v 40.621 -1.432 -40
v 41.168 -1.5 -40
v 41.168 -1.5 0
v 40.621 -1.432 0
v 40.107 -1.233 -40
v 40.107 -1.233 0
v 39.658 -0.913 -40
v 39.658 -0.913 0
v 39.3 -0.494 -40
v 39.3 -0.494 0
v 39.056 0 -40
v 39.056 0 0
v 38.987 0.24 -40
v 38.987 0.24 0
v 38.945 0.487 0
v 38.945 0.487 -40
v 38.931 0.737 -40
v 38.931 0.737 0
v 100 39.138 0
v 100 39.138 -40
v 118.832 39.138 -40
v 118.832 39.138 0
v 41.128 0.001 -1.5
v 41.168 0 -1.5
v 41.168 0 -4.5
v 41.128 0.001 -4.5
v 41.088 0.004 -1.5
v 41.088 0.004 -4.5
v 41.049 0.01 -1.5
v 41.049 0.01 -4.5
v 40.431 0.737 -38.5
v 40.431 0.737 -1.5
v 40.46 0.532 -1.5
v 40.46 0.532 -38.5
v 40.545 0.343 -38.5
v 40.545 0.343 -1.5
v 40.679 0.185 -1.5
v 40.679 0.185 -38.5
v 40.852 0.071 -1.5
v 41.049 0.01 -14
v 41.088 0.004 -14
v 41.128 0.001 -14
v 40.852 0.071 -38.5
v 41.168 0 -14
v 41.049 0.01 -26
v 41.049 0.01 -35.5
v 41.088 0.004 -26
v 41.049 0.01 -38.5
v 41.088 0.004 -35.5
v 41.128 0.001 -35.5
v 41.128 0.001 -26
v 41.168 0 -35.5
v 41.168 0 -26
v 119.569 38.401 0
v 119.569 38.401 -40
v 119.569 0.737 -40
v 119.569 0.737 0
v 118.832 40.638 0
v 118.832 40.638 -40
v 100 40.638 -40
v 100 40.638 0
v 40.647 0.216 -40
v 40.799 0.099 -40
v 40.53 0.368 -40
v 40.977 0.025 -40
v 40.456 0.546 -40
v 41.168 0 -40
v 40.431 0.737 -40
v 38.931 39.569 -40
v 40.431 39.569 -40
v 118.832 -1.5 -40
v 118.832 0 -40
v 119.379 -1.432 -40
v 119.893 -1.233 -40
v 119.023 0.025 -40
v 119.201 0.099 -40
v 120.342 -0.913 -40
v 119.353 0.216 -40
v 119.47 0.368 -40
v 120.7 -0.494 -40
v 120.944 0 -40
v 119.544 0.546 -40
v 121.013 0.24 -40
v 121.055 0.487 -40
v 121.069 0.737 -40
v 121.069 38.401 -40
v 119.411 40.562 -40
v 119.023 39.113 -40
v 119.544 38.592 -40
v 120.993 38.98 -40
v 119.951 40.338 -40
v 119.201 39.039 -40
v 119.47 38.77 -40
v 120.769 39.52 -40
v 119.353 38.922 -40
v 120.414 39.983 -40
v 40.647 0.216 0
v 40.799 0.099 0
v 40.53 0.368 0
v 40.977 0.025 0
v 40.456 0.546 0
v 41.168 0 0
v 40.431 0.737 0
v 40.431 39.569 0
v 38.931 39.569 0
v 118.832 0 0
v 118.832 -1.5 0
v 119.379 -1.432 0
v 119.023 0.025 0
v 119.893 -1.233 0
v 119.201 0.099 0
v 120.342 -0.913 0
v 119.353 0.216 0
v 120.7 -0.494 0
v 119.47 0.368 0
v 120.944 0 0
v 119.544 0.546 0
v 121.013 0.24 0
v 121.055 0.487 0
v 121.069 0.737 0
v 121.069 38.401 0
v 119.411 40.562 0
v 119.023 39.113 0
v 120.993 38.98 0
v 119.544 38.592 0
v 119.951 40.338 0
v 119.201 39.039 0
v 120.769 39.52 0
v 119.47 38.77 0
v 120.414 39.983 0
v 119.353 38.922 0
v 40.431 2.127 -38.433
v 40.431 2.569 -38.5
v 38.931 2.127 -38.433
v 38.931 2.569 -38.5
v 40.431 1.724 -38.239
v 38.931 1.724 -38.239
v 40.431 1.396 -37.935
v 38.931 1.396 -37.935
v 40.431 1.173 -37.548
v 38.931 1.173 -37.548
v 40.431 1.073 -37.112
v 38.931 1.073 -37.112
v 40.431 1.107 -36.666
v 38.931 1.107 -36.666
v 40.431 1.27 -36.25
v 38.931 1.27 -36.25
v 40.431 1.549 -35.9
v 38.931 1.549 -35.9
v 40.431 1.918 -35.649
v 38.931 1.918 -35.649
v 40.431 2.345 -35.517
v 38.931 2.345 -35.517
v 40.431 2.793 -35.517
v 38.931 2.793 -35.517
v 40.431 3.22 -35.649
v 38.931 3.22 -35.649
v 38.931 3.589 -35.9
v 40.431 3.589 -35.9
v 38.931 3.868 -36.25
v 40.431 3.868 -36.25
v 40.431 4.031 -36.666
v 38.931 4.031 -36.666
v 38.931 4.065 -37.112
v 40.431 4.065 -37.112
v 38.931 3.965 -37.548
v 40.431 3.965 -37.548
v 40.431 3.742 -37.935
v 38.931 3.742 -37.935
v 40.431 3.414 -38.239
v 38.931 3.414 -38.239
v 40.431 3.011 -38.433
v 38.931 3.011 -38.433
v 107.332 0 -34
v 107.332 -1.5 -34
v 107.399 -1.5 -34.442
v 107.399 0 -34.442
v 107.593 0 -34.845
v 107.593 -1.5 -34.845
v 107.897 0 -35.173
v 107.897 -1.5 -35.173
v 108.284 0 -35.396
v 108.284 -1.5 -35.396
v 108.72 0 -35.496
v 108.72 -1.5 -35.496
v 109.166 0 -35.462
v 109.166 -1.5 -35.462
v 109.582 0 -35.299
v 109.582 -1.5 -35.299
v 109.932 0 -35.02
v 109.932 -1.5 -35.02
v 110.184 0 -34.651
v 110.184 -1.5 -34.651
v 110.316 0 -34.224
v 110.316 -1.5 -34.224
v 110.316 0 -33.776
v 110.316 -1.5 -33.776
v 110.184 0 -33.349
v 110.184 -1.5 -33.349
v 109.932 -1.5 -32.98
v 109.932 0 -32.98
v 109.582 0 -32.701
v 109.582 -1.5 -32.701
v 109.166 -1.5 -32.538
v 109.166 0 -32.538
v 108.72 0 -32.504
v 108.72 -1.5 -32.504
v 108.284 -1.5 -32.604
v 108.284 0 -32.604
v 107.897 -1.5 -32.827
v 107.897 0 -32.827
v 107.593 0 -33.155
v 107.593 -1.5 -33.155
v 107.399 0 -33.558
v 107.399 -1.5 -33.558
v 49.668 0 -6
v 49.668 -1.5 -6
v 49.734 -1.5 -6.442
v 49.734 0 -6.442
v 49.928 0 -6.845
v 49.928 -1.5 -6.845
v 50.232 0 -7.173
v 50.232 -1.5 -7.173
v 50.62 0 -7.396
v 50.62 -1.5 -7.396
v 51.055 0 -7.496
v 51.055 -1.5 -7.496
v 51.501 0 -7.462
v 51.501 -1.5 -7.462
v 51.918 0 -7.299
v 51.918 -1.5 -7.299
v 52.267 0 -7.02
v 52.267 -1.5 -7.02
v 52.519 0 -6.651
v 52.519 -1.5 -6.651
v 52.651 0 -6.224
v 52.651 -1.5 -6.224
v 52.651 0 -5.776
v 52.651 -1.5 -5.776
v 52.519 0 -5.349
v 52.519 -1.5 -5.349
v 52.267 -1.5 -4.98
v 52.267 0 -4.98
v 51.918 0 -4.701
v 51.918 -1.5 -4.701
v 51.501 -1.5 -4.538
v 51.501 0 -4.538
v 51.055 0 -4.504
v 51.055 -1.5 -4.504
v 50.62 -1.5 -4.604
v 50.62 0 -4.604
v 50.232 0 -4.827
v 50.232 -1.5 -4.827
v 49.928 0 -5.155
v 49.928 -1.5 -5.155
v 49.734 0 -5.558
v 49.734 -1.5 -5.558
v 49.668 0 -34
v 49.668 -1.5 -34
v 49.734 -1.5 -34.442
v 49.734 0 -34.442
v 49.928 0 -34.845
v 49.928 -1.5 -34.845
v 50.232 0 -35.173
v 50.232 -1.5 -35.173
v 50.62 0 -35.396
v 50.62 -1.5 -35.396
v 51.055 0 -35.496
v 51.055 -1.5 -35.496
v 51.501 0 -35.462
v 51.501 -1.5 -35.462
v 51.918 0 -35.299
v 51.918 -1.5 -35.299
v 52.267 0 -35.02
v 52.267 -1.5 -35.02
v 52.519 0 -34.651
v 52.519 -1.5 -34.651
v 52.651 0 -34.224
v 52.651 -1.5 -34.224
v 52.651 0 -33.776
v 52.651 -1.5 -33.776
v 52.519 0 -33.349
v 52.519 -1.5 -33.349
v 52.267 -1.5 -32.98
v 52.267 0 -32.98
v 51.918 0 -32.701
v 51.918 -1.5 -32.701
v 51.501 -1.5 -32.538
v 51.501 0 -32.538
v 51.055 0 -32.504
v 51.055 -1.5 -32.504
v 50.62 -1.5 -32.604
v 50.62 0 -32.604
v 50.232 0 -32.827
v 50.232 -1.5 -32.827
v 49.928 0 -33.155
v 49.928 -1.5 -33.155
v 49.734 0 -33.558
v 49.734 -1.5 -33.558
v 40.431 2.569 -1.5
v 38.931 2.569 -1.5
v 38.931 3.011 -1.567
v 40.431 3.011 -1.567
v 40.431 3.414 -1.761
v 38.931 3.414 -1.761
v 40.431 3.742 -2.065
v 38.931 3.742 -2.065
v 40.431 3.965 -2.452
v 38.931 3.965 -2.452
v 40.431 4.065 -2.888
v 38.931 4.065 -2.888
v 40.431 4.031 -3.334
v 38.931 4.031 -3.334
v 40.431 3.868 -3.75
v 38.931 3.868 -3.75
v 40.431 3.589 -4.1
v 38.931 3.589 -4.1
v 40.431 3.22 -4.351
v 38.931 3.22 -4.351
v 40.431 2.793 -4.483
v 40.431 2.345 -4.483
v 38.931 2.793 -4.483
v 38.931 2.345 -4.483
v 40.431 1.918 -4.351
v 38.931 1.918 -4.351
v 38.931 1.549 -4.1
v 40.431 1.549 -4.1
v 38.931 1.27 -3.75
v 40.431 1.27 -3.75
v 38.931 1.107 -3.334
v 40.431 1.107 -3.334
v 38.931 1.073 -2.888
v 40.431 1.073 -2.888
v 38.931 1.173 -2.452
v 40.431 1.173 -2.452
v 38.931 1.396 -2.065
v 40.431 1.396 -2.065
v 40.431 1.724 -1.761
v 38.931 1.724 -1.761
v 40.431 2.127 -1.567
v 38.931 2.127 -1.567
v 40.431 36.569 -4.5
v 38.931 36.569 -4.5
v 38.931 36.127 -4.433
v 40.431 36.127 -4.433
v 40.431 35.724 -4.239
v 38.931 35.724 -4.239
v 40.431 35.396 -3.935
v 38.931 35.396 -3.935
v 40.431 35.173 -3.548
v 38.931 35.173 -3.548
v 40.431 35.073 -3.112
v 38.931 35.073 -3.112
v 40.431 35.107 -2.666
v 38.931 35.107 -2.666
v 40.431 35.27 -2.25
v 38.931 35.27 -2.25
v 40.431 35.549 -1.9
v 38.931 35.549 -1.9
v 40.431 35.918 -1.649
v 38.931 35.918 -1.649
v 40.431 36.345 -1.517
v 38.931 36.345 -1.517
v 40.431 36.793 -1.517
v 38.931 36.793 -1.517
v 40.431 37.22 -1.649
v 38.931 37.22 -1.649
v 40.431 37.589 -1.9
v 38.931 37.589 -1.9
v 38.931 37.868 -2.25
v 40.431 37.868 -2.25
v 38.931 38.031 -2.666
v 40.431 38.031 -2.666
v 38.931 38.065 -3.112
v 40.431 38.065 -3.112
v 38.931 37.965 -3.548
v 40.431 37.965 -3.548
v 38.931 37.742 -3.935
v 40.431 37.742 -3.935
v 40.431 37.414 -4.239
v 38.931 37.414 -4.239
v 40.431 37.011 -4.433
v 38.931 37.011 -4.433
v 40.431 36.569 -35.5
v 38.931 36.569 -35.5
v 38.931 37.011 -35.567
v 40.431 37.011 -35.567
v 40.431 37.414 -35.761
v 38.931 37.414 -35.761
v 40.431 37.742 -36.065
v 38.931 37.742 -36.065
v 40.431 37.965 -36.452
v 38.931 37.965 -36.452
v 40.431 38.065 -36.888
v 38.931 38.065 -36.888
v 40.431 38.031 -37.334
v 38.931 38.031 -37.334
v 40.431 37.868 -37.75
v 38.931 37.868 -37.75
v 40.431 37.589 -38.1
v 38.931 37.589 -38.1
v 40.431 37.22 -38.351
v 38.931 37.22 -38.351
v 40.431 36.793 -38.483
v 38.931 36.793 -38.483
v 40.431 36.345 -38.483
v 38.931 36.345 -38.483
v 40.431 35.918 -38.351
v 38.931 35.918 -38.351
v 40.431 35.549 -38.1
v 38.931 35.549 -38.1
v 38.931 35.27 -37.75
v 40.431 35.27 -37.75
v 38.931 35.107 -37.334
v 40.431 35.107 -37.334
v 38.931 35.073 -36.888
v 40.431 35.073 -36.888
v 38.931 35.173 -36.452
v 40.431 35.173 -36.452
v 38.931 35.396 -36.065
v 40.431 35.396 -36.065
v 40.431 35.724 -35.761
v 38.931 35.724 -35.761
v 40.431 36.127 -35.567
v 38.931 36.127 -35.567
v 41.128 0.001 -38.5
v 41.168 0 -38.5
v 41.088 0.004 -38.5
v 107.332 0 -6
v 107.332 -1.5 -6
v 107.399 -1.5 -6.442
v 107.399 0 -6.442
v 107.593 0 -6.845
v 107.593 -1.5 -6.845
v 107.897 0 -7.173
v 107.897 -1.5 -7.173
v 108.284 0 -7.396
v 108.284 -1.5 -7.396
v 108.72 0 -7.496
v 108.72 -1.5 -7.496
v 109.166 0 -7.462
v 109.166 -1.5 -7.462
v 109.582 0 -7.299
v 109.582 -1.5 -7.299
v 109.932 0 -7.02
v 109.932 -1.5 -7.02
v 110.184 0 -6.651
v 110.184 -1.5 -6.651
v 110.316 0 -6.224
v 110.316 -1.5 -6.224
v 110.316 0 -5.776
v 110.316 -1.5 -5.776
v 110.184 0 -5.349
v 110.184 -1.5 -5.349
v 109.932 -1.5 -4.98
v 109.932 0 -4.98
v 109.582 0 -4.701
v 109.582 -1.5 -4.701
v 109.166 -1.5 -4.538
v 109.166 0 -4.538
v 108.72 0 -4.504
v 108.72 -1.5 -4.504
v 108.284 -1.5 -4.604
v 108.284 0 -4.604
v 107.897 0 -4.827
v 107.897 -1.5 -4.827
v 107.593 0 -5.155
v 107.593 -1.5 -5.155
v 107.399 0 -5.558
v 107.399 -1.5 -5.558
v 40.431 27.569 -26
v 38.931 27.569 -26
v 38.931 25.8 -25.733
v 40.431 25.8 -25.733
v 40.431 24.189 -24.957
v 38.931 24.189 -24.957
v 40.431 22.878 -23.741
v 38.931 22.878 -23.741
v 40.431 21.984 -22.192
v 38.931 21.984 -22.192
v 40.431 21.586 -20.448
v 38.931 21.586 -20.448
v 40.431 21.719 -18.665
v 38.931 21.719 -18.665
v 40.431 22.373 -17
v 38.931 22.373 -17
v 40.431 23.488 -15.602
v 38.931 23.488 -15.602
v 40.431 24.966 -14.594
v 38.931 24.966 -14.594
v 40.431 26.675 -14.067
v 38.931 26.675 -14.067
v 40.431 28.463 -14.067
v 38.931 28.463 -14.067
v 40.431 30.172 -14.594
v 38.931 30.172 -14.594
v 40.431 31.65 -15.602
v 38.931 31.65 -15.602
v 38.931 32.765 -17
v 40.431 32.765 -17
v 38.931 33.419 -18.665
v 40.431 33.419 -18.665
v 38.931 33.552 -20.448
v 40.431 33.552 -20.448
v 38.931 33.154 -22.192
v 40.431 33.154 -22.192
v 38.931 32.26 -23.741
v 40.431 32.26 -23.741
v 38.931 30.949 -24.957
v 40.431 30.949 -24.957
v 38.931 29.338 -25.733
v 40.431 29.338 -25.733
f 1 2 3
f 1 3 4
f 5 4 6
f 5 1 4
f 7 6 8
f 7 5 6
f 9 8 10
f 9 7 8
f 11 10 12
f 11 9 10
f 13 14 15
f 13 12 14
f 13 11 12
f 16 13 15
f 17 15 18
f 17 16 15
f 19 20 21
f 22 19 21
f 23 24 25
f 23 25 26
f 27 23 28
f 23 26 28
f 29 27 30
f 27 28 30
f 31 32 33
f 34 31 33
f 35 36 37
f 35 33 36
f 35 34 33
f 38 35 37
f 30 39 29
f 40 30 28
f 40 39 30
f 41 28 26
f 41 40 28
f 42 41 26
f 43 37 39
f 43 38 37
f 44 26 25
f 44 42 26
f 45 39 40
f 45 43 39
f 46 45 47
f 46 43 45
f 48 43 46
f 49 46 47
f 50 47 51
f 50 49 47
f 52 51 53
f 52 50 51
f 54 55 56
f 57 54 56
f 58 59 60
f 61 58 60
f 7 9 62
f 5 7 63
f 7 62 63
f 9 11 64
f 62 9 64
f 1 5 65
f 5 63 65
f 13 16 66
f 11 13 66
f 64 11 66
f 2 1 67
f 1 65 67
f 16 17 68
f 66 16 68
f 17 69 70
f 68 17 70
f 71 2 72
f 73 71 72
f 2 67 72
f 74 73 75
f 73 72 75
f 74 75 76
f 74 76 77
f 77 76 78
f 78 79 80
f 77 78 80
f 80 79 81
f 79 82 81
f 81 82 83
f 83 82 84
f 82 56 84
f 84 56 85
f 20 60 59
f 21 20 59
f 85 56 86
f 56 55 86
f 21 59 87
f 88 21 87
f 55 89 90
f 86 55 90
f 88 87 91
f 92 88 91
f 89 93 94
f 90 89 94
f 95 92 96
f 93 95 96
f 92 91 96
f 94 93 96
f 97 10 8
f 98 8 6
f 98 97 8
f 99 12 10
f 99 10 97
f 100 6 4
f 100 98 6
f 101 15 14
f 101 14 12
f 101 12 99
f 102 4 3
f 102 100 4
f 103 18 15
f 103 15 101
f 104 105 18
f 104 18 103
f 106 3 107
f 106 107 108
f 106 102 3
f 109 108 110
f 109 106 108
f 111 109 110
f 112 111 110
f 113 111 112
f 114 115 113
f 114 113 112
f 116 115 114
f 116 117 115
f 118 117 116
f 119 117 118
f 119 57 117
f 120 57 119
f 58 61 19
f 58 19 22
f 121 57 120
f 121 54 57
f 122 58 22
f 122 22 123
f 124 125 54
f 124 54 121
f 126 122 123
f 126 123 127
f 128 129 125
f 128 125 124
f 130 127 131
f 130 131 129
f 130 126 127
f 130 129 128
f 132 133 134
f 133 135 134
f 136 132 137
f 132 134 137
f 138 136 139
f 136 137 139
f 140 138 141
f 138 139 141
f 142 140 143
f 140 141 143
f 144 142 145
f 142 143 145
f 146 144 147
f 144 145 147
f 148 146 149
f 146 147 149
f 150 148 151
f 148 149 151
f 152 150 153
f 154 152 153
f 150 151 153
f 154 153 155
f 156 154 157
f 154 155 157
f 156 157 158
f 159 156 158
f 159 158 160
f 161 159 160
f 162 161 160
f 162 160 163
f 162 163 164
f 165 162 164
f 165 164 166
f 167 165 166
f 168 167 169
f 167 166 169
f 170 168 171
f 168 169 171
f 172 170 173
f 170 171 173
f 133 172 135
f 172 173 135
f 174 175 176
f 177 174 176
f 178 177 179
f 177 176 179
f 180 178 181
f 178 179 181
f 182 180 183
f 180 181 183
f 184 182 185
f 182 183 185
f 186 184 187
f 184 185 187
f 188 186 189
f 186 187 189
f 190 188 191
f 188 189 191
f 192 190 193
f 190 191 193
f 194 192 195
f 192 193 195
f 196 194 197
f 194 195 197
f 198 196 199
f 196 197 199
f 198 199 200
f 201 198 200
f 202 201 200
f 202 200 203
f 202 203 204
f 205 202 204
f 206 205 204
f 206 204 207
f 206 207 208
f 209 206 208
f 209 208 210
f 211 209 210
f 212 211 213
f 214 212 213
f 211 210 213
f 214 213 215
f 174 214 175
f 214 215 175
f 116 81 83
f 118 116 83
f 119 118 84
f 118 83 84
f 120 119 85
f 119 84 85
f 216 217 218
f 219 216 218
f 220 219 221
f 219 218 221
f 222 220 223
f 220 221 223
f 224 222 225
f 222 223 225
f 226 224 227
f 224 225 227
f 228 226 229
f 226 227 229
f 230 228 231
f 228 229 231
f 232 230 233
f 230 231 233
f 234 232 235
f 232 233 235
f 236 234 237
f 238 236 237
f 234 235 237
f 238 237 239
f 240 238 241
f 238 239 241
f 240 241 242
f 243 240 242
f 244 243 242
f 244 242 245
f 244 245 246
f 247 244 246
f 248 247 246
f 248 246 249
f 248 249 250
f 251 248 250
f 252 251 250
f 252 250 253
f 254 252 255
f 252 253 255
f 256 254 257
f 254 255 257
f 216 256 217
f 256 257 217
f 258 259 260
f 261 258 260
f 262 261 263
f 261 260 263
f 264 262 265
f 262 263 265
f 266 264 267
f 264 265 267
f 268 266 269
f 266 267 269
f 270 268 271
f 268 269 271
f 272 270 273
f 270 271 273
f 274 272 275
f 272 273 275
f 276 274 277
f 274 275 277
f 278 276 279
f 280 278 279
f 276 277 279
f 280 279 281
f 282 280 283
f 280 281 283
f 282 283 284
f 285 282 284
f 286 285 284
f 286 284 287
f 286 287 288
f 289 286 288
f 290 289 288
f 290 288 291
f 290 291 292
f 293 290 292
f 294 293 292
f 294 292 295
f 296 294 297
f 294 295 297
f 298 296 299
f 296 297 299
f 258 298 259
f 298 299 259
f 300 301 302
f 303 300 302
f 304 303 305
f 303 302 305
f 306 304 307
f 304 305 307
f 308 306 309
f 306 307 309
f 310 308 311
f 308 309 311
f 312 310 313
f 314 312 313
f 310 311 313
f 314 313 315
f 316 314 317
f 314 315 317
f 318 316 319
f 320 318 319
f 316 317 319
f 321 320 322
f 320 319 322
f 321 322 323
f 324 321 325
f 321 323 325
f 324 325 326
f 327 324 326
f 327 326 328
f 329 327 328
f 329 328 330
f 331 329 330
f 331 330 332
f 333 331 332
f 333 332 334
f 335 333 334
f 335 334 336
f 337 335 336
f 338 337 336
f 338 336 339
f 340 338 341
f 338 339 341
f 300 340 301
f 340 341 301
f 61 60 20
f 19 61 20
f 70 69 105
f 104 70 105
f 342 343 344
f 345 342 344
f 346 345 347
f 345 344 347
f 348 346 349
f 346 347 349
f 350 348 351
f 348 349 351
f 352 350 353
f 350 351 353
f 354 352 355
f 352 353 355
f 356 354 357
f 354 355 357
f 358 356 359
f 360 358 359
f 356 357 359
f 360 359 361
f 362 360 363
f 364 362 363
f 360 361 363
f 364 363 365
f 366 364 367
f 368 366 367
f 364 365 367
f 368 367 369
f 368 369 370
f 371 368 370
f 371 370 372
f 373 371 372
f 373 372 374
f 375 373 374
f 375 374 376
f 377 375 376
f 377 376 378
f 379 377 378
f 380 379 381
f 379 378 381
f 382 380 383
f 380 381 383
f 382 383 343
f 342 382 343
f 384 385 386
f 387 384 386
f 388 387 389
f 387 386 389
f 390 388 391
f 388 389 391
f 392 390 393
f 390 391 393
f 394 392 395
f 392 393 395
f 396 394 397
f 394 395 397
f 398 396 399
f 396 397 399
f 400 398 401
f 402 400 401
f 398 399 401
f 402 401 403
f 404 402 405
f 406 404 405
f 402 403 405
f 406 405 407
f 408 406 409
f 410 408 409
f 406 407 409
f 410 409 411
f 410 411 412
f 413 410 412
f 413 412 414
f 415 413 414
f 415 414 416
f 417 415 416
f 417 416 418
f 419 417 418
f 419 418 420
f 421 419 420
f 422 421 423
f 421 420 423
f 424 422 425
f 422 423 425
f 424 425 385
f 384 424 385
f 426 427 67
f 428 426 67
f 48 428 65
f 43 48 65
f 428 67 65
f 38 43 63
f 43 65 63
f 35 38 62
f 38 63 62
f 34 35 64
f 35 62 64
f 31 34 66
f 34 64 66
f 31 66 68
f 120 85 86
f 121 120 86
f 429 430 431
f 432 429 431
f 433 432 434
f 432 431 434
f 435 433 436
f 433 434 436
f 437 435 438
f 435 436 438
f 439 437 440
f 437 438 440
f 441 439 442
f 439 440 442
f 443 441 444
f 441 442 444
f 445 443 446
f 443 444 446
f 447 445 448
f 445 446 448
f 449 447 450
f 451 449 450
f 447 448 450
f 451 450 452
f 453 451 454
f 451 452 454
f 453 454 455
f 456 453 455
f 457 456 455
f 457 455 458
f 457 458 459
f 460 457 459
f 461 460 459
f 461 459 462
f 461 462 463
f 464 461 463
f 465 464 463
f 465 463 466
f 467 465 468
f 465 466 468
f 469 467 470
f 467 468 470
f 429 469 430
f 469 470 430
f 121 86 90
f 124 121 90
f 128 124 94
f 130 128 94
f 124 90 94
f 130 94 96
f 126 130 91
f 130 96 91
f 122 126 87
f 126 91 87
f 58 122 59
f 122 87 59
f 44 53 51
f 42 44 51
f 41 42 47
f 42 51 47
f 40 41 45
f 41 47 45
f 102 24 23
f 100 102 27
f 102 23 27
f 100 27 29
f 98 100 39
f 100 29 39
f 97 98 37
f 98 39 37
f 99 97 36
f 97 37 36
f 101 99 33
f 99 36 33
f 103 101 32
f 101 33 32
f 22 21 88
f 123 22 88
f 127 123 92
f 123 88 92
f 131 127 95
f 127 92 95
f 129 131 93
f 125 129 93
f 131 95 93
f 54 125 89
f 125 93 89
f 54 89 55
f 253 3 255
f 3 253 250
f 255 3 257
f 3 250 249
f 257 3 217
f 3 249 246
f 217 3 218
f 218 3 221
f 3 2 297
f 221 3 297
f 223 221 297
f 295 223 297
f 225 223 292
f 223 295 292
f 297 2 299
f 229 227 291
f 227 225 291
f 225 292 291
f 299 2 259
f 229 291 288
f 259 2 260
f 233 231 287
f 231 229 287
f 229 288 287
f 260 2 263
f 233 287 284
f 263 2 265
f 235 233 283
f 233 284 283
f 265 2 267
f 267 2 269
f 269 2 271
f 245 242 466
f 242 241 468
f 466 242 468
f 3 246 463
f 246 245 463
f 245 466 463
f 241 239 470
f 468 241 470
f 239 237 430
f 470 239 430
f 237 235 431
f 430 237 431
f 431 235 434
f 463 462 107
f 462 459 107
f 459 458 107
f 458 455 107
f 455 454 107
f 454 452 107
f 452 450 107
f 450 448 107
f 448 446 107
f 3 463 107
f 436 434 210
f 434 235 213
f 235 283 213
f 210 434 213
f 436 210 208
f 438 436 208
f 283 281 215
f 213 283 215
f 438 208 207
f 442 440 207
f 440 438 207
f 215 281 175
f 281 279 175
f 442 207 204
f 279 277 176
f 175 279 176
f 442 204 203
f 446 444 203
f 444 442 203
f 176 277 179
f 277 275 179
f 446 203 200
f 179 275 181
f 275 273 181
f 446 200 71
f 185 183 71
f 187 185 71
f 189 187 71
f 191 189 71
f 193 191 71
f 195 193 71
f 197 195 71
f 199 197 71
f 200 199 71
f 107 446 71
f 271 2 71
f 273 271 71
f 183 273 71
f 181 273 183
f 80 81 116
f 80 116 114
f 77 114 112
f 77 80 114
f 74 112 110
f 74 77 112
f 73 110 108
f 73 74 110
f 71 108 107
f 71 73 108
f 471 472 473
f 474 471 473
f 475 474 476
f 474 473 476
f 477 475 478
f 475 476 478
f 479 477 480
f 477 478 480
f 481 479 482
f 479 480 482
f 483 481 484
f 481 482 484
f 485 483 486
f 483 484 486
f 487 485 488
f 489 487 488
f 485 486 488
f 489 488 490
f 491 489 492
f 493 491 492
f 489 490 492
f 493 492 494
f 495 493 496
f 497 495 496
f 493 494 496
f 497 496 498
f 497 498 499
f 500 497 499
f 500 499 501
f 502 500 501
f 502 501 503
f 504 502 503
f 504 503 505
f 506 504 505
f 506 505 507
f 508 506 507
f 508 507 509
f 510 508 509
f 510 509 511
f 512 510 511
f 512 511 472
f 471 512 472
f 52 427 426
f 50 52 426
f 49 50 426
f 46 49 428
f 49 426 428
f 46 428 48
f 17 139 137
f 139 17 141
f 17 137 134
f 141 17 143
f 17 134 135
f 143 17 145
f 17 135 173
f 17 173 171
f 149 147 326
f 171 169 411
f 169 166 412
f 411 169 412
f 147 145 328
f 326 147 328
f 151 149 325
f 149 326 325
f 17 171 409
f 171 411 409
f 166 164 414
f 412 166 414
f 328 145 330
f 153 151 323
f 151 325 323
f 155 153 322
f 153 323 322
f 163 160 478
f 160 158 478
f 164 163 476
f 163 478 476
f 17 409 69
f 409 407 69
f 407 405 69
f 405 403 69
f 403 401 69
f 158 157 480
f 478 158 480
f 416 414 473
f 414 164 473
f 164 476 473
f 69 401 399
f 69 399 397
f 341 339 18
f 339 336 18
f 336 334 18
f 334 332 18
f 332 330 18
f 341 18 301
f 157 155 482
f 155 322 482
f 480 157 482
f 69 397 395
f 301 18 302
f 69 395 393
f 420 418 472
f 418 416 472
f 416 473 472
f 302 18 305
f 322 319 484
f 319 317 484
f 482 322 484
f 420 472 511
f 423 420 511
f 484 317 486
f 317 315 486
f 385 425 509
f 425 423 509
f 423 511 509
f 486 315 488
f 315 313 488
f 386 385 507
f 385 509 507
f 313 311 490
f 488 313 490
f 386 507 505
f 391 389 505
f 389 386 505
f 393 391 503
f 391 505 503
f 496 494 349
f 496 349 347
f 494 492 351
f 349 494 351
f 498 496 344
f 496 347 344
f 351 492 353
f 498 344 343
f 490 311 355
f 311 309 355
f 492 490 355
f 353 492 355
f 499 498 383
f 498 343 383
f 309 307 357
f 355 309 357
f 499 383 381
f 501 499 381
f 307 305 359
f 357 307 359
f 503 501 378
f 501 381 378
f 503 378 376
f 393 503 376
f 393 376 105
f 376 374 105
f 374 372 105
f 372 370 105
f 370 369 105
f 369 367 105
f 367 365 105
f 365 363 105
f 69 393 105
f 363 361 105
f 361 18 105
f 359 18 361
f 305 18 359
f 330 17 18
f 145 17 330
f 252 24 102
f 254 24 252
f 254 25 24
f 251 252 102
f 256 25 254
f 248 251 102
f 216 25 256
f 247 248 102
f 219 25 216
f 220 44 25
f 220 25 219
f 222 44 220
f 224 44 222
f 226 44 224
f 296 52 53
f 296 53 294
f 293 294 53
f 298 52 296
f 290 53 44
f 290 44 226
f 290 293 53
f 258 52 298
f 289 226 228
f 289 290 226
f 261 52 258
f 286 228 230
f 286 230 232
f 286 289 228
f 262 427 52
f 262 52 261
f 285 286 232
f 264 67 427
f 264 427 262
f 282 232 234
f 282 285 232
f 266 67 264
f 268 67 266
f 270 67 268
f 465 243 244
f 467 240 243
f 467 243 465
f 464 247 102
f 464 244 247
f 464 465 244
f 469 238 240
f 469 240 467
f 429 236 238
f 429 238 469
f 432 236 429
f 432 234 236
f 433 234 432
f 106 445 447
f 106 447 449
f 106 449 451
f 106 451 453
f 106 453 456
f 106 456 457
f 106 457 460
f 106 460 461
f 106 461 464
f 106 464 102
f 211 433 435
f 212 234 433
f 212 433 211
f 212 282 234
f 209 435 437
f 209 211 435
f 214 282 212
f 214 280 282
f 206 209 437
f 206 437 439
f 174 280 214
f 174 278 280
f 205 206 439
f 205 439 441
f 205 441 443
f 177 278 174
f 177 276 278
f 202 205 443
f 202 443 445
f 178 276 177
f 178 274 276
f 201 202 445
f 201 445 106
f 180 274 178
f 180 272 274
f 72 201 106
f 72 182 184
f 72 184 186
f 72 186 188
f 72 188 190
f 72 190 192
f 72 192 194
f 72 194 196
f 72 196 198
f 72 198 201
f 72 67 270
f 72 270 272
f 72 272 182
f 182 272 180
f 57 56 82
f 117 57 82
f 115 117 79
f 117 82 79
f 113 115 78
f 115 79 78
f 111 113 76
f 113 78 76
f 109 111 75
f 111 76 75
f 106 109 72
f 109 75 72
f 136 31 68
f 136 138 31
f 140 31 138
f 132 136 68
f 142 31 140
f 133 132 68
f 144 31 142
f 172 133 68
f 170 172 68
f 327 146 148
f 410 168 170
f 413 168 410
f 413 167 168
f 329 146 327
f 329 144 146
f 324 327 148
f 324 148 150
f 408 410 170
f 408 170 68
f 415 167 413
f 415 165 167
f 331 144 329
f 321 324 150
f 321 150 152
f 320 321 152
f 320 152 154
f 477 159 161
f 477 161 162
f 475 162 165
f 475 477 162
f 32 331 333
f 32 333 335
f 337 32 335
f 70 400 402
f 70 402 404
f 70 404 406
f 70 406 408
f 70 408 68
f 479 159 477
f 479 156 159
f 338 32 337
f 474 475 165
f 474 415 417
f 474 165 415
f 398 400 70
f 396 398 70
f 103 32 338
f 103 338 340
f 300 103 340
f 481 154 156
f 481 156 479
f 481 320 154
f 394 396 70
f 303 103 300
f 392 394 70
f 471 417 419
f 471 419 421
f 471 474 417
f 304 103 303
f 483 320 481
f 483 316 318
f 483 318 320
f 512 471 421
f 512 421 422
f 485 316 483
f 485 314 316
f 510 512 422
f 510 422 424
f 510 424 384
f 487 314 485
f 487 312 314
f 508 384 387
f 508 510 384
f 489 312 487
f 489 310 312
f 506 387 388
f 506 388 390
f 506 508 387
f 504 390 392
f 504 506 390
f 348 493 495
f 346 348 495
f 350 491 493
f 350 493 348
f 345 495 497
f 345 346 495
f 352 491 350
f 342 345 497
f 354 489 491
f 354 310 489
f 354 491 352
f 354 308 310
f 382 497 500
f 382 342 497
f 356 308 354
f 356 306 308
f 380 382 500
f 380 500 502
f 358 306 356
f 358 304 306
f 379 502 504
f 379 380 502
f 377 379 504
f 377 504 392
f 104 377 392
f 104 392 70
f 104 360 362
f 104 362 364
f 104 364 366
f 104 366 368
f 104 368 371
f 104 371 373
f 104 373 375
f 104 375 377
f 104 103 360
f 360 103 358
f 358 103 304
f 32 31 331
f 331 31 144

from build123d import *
from build123d.topology import SkipClean

# Parameters (mm, degrees)
SKETCH1_R                       = 6
SKETCH1_R_2                     = 1.5
BASE_FLANGE2_DEPTH              = 1.5
SKETCHED_START                  = -40
SKETCHED_BEND1_DEPTH            = 40
SKETCHED_BEND1_2_DEPTH          = 40
SKETCHED_START_2                = -35.4999999
SKETCHED_BEND1_3_DEPTH          = 9.4999998
SKETCHED_START_3                = -13.9999999
SKETCHED_BEND1_4_DEPTH          = 9.4999998
SKETCHED_BEND1_5_DEPTH          = 1.4999999
SKETCHED_START_4                = -1.4999999
SKETCHED_BEND1_6_DEPTH          = 1.4999999
SKETCHED_START_5                = 38.93097291
SKETCHED_BEND1_7_DEPTH          = 1.5
SKETCHED_START_6                = 40.43097291
SKETCHED_BEND1_8_DEPTH          = 0.618240168
SKETCHED_START_7                = -38.5000001
SKETCHED_BEND1_9_DEPTH          = 37.00000011
SKETCHED_BEND1_10_DEPTH         = 37.00000011
F_3_0MM_PRESS_DOWEL_HOLE1_D     = 3
F_3_0MM_PRESS_DOWEL_HOLE1_DEPTH = 1.5
F_3_0MM_PRESS_DOWEL_HOLE2_D     = 3
F_3_0MM_PRESS_DOWEL_HOLE2_DEPTH = 6
F_3_0MM_PRESS_DOWEL_HOLE2_TIP   = 0.901290929
F_3_0MM_PRESS_DOWEL_HOLE3_D     = 3
F_3_0MM_PRESS_DOWEL_HOLE3_DEPTH = 6
F_3_0MM_PRESS_DOWEL_HOLE3_TIP   = 0.901290929


with BuildPart() as part:
    # Base-Flange2: sheet metal written as solids
    # Sketch1 → Base-Flange2 (new body)
    with BuildSketch(Plane(origin=(0, 0, 0), x_dir=(1, 0, 0), z_dir=(0, 1, 0))):
        Polygon((0, 0), (40, 0), (120, 0), (160, 0), (180, 0), (180, 40), (160, 40), (120, 40), (40, 40), (0, 40), align=None)
        with Locations(Location((12, 20, 0), (0, 0, 270))):
            Circle(SKETCH1_R, mode=Mode.SUBTRACT)
        with Locations(Location((3, 37, 0), (0, 0, 270))):
            Circle(SKETCH1_R_2, mode=Mode.SUBTRACT)
        with Locations(Location((37, 37, 0), (0, 0, 270))):
            Circle(SKETCH1_R_2, mode=Mode.SUBTRACT)
        with Locations(Location((37, 3, 0), (0, 0, 270))):
            Circle(SKETCH1_R_2, mode=Mode.SUBTRACT)
        with Locations(Location((3, 3, 0), (0, 0, 270))):
            Circle(SKETCH1_R_2, mode=Mode.SUBTRACT)
    extrude(amount=-BASE_FLANGE2_DEPTH)

    # Sketched Bend1: read off the stored shape, not the designer's step
    # Sketched Bend1 outline → Sketched Bend1 (cut)
    with BuildSketch(Plane.XY.offset(SKETCHED_START)):
        with BuildLine():
            Line((180, 0), (120.944250946, 0))
            ThreePointArc((120.944250946, 0), (120.127591172, -1.086838938), (118.83242709, -1.5))
            Line((118.83242709, -1.5), (180, -1.5))
            Line((180, -1.5), (180, 0))
        make_face()
        with BuildLine():
            Line((0, -1.5), (41.16757291, -1.5))
            ThreePointArc((41.16757291, -1.5), (39.872408828, -1.086838938), (39.055749054, 0))
            Line((39.055749054, 0), (0, 0))
            Line((0, 0), (0, -1.5))
        make_face()
    extrude(amount=SKETCHED_BEND1_DEPTH, mode=Mode.SUBTRACT)

    # Sketched Bend1 2 outline → Sketched Bend1 2 (add)
    with BuildSketch(Plane.XY.offset(SKETCHED_START)):
        with BuildLine():
            ThreePointArc((120.944250946, 0), (121.037612433, 0.363053267), (121.06902709, 0.7366))
            Line((121.06902709, 0.7366), (121.06902709, 38.401454181))
            ThreePointArc((121.06902709, 38.401454181), (120.413942116, 39.982969207), (118.83242709, 40.638054181))
            Line((118.83242709, 40.638054181), (100, 40.638054181))
            Line((100, 40.638054181), (100, 39.138054181))
            Line((100, 39.138054181), (118.83242709, 39.138054181))
            ThreePointArc((118.83242709, 39.138054181), (119.353281945, 38.922309036), (119.56902709, 38.401454181))
            Line((119.56902709, 38.401454181), (119.56902709, 0.7366))
            ThreePointArc((119.56902709, 0.7366), (119.353281945, 0.215745145), (118.83242709, 0))
            Line((118.83242709, 0), (120.944250946, 0))
        make_face()
    extrude(amount=SKETCHED_BEND1_2_DEPTH)

    # Sketched Bend1 3 outline → Sketched Bend1 3 (add)
    with BuildSketch(Plane.XY.offset(SKETCHED_START_2)):
        with BuildLine():
            Line((39.055749054, 0), (41.16757291, 0))
            ThreePointArc((41.16757291, 0), (40.646718055, 0.215745145), (40.43097291, 0.7366))
            Line((40.43097291, 0.7366), (40.43097291, 39.56902709))
            Line((40.43097291, 39.56902709), (38.93097291, 39.56902709))
            Line((38.93097291, 39.56902709), (38.93097291, 0.7366))
            ThreePointArc((38.93097291, 0.7366), (38.962387567, 0.363053267), (39.055749054, 0))
        make_face()
    extrude(amount=SKETCHED_BEND1_3_DEPTH)

    # Sketched Bend1 4 outline → Sketched Bend1 4 (add)
    with BuildSketch(Plane.XY.offset(SKETCHED_START_3)):
        with BuildLine():
            Line((39.055749054, 0), (41.16757291, 0))
            ThreePointArc((41.16757291, 0), (40.646718055, 0.215745145), (40.43097291, 0.7366))
            Line((40.43097291, 0.7366), (40.43097291, 39.56902709))
            Line((40.43097291, 39.56902709), (38.93097291, 39.56902709))
            Line((38.93097291, 39.56902709), (38.93097291, 0.7366))
            ThreePointArc((38.93097291, 0.7366), (38.962387567, 0.363053267), (39.055749054, 0))
        make_face()
    extrude(amount=SKETCHED_BEND1_4_DEPTH)

    # Sketched Bend1 5 outline → Sketched Bend1 5 (add)
    with BuildSketch(Plane.XY.offset(SKETCHED_START)):
        with BuildLine():
            Line((39.055749054, 0), (41.16757291, 0))
            ThreePointArc((41.16757291, 0), (40.646718055, 0.215745145), (40.43097291, 0.7366))
            Line((40.43097291, 0.7366), (40.43097291, 39.56902709))
            Line((40.43097291, 39.56902709), (38.93097291, 39.56902709))
            Line((38.93097291, 39.56902709), (38.93097291, 0.7366))
            ThreePointArc((38.93097291, 0.7366), (38.962387567, 0.363053267), (39.055749054, 0))
        make_face()
    extrude(amount=SKETCHED_BEND1_5_DEPTH)

    # Sketched Bend1 6 outline → Sketched Bend1 6 (add)
    with BuildSketch(Plane.XY.offset(SKETCHED_START_4)):
        with BuildLine():
            Line((39.055749054, 0), (41.16757291, 0))
            ThreePointArc((41.16757291, 0), (40.646718055, 0.215745145), (40.43097291, 0.7366))
            Line((40.43097291, 0.7366), (40.43097291, 39.56902709))
            Line((40.43097291, 39.56902709), (38.93097291, 39.56902709))
            Line((38.93097291, 39.56902709), (38.93097291, 0.7366))
            ThreePointArc((38.93097291, 0.7366), (38.962387567, 0.363053267), (39.055749054, 0))
        make_face()
    extrude(amount=SKETCHED_BEND1_6_DEPTH)

    # Sketched Bend1 7 outline → Sketched Bend1 7 (add)
    with BuildSketch(Plane.YZ.offset(SKETCHED_START_5)):
        with BuildLine():
            Line((36.56902709, -38.5), (39.56902709, -38.5000001))
            Line((39.56902709, -38.5000001), (39.56902709, -35.4999999))
            Line((39.56902709, -35.4999999), (36.56902709, -35.5))
            ThreePointArc((36.56902709, -35.5), (38.06902709, -37), (36.56902709, -38.5))
        make_face()
        with BuildLine():
            Line((2.569027031, -38.5), (36.56902709, -38.5))
            ThreePointArc((36.56902709, -38.5), (35.06902709, -37), (36.56902709, -35.5))
            Line((36.56902709, -35.5), (2.56902709, -35.5))
            ThreePointArc((2.56902709, -35.5), (4.06902709, -37.000000029), (2.569027031, -38.5))
        make_face()
        with BuildLine():
            Line((27.56902709, -26), (39.56902709, -26.0000001))
            Line((39.56902709, -26.0000001), (39.56902709, -13.9999999))
            Line((39.56902709, -13.9999999), (27.56902709, -14))
            ThreePointArc((27.56902709, -14), (33.56902709, -20), (27.56902709, -26))
        make_face()
        with BuildLine():
            Line((0, -38.5000001), (2.569027031, -38.5))
            ThreePointArc((2.569027031, -38.5), (1.06902709, -36.999999971), (2.56902709, -35.5))
            Line((2.56902709, -35.5), (0, -35.4999999))
            Line((0, -35.4999999), (0, -38.5000001))
        make_face()
        with BuildLine():
            Line((0, -26.0000001), (27.56902709, -26))
            ThreePointArc((27.56902709, -26), (21.56902709, -20), (27.56902709, -14))
            Line((27.56902709, -14), (0, -13.9999999))
            Line((0, -13.9999999), (0, -26.0000001))
        make_face()
        with BuildLine():
            Line((36.56902709, -4.5), (39.56902709, -4.5000001))
            Line((39.56902709, -4.5000001), (39.56902709, -1.4999999))
            Line((39.56902709, -1.4999999), (36.56902709, -1.5))
            ThreePointArc((36.56902709, -1.5), (38.06902709, -3), (36.56902709, -4.5))
        make_face()
        with BuildLine():
            Line((2.56902709, -4.5), (36.56902709, -4.5))
            ThreePointArc((36.56902709, -4.5), (35.06902709, -3), (36.56902709, -1.5))
            Line((36.56902709, -1.5), (2.569027095, -1.5))
            ThreePointArc((2.569027095, -1.5), (4.06902709, -3.000000002), (2.56902709, -4.5))
        make_face()
        with BuildLine():
            Line((0, -4.5000001), (2.56902709, -4.5))
            ThreePointArc((2.56902709, -4.5), (1.06902709, -2.999999998), (2.569027095, -1.5))
            Line((2.569027095, -1.5), (0, -1.4999999))
            Line((0, -1.4999999), (0, -4.5000001))
        make_face()
    extrude(amount=SKETCHED_BEND1_7_DEPTH)

    # Sketched Bend1 8 outline → Sketched Bend1 8 (add)
    with BuildSketch(Plane.YZ.offset(SKETCHED_START_6)):
        with BuildLine():
            Line((0, -38.5000001), (2.569027031, -38.5))
            ThreePointArc((2.569027031, -38.5), (1.06902709, -36.999999971), (2.56902709, -35.5))
            Line((2.56902709, -35.5), (0, -35.4999999))
            Line((0, -35.4999999), (0, -38.5000001))
        make_face()
        with BuildLine():
            Line((0, -26.0000001), (27.56902709, -26))
            ThreePointArc((27.56902709, -26), (21.56902709, -20), (27.56902709, -14))
            Line((27.56902709, -14), (0, -13.9999999))
            Line((0, -13.9999999), (0, -26.0000001))
        make_face()
        with BuildLine():
            Line((0, -4.5000001), (2.56902709, -4.5))
            ThreePointArc((2.56902709, -4.5), (1.06902709, -2.999999998), (2.569027095, -1.5))
            Line((2.569027095, -1.5), (0, -1.4999999))
            Line((0, -1.4999999), (0, -4.5000001))
        make_face()
    extrude(amount=SKETCHED_BEND1_8_DEPTH)

    # Sketched Bend1 9 outline → Sketched Bend1 9 (cut)
    with SkipClean():  # the faces are left unmerged after this step: merging them gives an invalid solid
        with BuildSketch(Plane.XY.offset(SKETCHED_START_7)):
            with BuildLine():
                ThreePointArc((40.43097291, 0.7366), (40.606429696, 0.259423037), (41.049213078, 0.009571452))
                Line((41.049213078, 0.009571452), (41.049213078, 27.56902709))
                Line((41.049213078, 27.56902709), (40.43097291, 27.56902709))
                Line((40.43097291, 27.56902709), (40.43097291, 0.7366))
            make_face()
            with BuildLine():
                ThreePointArc((39.055749054, 0), (38.962387567, 0.363053267), (38.93097291, 0.7366))
                Line((38.93097291, 0.7366), (38.93097291, 0))
                Line((38.93097291, 0), (39.055749054, 0))
            make_face()
        extrude(amount=SKETCHED_BEND1_9_DEPTH, mode=Mode.SUBTRACT)

    # Sketched Bend1 10 outline → Sketched Bend1 10 (add)
    with SkipClean():  # the faces are left unmerged after this step: merging them gives an invalid solid
        with BuildSketch(Plane.XY.offset(SKETCHED_START_7)):
            with BuildLine():
                ThreePointArc((41.16757291, 0), (41.108199805, 0.002396762), (41.049213078, 0.009571452))
                Line((41.049213078, 0.009571452), (41.049213078, 0))
                Line((41.049213078, 0), (41.16757291, 0))
            make_face()
        extrude(amount=SKETCHED_BEND1_10_DEPTH)

    # Ø3.0mm Press Dowel Hole1
    with Locations(Plane(origin=(0, 0, 0), x_dir=(1, 0, 0), z_dir=(0, 1, 0))):
        with Locations((108.83242709, 34), (108.83242709, 6), (51.16757291, 6), (51.16757291, 34)):
            Hole(F_3_0MM_PRESS_DOWEL_HOLE1_D / 2, depth=F_3_0MM_PRESS_DOWEL_HOLE1_DEPTH)

    # Ø3.0mm Press Dowel Hole2
    with Locations(Plane(origin=(-87.600386311, -7.5, 7.525513363), x_dir=(0, 0, -1), z_dir=(0, -1, 0))):
        with Locations((220.525513363, 156.531359221), (102.525513363, 181.531359221), (102.525513363, 271.531359221), (89.19270005, 226.531359221), (210.525513363, 317.793651488), (230.525513363, 317.793651488), (252.525513363, 320.462332131), (232.525513363, 300.462332131), (252.525513363, 132.600386311), (232.525513363, 152.600386311), (111.286271896, 136.531359221), (91.286271896, 136.531359221), (41.525513363, 196.432813402), (13.525513363, 196.432813402), (41.525513363, 138.767959221), (13.525513363, 138.767959221), (41.525513363, 256.62990504), (13.525513363, 256.62990504), (41.525513363, 314.294759221), (13.525513363, 314.294759221)):
            Hole(F_3_0MM_PRESS_DOWEL_HOLE2_D / 2, depth=F_3_0MM_PRESS_DOWEL_HOLE2_DEPTH)
            with Locations((0, 0, -(F_3_0MM_PRESS_DOWEL_HOLE2_DEPTH + F_3_0MM_PRESS_DOWEL_HOLE2_TIP / 2))):  # 118° drill point
                Cone(0, F_3_0MM_PRESS_DOWEL_HOLE2_D / 2, F_3_0MM_PRESS_DOWEL_HOLE2_TIP, mode=Mode.SUBTRACT)

    # Ø3.0mm Press Dowel Hole3
    with Locations(Plane(origin=(365.462332131, -7.5, -47.525513363), x_dir=(0, 0, 1), z_dir=(0, -1, 0))):
        with Locations((220.525513363, 156.531359221), (102.525513363, 181.531359221), (102.525513363, 271.531359221), (89.19270005, 226.531359221), (210.525513363, 317.793651488), (230.525513363, 317.793651488), (252.525513363, 320.462332131), (232.525513363, 300.462332131), (252.525513363, 132.600386311), (232.525513363, 152.600386311), (111.286271896, 136.531359221), (91.286271896, 136.531359221), (41.525513363, 196.432813402), (13.525513363, 196.432813402), (41.525513363, 138.767959221), (13.525513363, 138.767959221), (41.525513363, 256.62990504), (13.525513363, 256.62990504), (41.525513363, 314.294759221), (13.525513363, 314.294759221)):
            Hole(F_3_0MM_PRESS_DOWEL_HOLE3_D / 2, depth=F_3_0MM_PRESS_DOWEL_HOLE3_DEPTH)
            with Locations((0, 0, -(F_3_0MM_PRESS_DOWEL_HOLE3_DEPTH + F_3_0MM_PRESS_DOWEL_HOLE3_TIP / 2))):  # 118° drill point
                Cone(0, F_3_0MM_PRESS_DOWEL_HOLE3_D / 2, F_3_0MM_PRESS_DOWEL_HOLE3_TIP, mode=Mode.SUBTRACT)


solid = part.part
